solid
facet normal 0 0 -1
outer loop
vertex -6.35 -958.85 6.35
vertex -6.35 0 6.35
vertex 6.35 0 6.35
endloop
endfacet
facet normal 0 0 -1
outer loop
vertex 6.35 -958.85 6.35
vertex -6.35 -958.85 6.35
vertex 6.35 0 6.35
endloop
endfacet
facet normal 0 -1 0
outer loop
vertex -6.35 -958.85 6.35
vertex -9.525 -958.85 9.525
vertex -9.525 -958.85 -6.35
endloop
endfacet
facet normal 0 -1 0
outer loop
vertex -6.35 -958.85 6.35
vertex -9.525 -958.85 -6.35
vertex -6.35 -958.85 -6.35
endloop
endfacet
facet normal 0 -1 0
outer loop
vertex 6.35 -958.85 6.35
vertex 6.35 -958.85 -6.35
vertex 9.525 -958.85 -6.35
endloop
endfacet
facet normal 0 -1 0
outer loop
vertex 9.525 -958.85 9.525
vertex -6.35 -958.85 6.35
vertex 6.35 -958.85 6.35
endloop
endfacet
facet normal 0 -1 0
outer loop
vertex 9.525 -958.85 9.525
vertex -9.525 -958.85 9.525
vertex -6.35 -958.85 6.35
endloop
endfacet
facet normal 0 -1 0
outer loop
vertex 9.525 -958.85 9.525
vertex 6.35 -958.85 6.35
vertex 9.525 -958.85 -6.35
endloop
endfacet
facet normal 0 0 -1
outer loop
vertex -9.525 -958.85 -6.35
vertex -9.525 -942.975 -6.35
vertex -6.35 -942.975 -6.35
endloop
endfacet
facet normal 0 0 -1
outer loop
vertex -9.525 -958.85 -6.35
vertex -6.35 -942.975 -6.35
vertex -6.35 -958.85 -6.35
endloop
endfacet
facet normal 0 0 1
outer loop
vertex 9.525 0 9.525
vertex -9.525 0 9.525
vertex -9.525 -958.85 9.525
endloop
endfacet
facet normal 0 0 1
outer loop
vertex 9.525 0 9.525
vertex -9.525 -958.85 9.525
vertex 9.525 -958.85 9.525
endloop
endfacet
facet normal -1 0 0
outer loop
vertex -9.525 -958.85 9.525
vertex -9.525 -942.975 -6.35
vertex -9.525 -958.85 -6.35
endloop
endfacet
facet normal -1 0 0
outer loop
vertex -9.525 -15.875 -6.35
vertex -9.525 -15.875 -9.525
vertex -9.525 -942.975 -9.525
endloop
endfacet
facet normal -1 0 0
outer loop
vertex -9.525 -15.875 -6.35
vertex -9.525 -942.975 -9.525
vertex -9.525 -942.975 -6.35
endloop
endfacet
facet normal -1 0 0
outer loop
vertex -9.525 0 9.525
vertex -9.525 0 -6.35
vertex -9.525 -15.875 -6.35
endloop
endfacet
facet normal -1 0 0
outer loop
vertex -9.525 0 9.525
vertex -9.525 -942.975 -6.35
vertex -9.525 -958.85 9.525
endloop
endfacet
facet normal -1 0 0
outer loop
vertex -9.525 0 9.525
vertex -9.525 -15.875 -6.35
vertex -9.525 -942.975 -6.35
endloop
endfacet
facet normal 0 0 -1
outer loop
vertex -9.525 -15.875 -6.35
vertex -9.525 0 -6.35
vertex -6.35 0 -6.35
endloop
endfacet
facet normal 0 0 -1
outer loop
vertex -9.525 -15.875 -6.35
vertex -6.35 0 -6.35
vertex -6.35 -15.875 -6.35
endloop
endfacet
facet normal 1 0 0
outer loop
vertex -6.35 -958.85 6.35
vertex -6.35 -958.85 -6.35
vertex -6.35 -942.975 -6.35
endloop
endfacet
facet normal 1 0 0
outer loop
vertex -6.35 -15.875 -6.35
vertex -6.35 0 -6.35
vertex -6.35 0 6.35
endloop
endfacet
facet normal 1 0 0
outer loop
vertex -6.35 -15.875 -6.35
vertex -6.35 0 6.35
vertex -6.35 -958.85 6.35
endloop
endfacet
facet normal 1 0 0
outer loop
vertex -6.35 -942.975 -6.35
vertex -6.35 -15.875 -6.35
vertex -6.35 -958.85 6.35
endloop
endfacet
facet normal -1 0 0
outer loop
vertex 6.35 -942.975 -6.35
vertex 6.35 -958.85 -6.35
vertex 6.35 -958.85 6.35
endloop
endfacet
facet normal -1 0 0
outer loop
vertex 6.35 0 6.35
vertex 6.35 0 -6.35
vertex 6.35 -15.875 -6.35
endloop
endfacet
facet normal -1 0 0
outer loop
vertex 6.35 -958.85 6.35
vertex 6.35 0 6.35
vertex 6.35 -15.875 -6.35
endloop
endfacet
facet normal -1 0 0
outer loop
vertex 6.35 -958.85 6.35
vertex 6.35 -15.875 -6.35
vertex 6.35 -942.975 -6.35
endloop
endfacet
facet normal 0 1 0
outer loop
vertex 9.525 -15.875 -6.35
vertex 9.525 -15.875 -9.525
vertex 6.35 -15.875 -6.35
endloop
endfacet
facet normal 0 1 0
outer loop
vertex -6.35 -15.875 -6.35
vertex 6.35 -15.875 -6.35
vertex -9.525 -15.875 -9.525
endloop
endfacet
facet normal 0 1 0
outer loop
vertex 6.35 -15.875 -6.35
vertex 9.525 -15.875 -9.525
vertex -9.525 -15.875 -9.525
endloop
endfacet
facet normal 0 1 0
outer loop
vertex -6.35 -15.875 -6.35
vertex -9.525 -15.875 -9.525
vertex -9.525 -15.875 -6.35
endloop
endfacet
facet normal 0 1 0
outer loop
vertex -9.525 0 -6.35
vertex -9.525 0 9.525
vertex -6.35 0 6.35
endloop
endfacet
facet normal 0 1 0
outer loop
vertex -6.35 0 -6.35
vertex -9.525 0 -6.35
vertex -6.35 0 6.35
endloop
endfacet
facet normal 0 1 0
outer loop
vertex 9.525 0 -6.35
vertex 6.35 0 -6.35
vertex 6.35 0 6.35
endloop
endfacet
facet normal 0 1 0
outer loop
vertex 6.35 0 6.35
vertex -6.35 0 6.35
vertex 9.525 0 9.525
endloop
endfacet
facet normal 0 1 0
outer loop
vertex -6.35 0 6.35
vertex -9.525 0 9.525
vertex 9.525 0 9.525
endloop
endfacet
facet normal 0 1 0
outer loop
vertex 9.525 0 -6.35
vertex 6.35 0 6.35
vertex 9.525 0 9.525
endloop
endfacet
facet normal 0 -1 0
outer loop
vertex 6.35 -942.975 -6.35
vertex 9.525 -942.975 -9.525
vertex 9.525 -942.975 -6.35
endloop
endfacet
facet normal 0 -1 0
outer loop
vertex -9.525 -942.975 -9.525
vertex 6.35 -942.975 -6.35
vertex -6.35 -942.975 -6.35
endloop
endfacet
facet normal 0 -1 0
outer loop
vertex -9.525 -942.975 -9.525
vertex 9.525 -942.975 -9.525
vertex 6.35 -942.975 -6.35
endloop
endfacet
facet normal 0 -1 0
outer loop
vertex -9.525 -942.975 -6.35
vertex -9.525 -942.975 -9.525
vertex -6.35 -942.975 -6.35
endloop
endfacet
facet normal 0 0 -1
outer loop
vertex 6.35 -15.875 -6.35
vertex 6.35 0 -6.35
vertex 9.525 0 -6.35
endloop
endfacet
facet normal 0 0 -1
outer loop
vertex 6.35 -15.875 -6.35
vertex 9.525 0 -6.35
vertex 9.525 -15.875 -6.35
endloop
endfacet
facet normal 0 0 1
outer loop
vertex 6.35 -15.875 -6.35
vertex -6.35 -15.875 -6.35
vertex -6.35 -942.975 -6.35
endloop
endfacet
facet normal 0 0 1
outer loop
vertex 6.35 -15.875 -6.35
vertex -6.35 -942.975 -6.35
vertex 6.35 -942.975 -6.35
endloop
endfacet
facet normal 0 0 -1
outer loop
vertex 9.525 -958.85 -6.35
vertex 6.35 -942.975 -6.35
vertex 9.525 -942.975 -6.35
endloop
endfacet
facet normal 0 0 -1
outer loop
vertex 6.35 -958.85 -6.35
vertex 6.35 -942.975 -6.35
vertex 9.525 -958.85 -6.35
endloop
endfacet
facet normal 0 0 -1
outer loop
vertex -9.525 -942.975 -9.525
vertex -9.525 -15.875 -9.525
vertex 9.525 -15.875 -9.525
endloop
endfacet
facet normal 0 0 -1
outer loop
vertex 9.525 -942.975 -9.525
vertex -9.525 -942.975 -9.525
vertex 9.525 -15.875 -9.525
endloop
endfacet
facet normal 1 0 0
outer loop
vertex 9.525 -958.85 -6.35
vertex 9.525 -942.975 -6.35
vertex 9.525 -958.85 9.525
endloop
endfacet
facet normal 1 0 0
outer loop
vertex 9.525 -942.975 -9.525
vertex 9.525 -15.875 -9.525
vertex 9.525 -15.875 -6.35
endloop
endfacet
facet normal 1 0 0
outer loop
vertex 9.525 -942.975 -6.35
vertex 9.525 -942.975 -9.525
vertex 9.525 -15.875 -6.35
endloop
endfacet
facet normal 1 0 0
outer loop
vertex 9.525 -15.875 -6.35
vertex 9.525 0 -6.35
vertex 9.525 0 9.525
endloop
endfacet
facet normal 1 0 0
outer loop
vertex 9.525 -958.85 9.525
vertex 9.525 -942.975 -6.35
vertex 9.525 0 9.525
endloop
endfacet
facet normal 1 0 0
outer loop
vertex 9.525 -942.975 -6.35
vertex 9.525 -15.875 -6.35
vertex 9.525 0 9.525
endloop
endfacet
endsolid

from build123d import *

# Parameters (mm, degrees)
F0_W     = 19.05
F0_H     = 19.05
F0_W_2   = 12.7
F0_H_2   = 12.7
F1_DEPTH = 958.85
F2_W     = 15.875
F2_H     = 3.175
F3_DEPTH = 19.05


with BuildPart() as f1:
    # F0 (on Front) → F1 (new body)
    with BuildSketch(Plane.XZ):
        Rectangle(F0_W, F0_H)
        Rectangle(F0_W_2, F0_H_2, mode=Mode.SUBTRACT)
    extrude(amount=F1_DEPTH)

    # F2 (on face) → F3 (cut)
    with BuildSketch(Plane(origin=(-9.525, 0, 0), x_dir=(0, -1, 0), z_dir=(-1, 0, 0))):
        with Locations((7.9375, -7.9375)):
            Rectangle(F2_W, F2_H)
        with Locations((950.9125, -7.9375)):
            Rectangle(F2_W, F2_H)
    extrude(amount=-F3_DEPTH, mode=Mode.SUBTRACT)


solid = f1.part
